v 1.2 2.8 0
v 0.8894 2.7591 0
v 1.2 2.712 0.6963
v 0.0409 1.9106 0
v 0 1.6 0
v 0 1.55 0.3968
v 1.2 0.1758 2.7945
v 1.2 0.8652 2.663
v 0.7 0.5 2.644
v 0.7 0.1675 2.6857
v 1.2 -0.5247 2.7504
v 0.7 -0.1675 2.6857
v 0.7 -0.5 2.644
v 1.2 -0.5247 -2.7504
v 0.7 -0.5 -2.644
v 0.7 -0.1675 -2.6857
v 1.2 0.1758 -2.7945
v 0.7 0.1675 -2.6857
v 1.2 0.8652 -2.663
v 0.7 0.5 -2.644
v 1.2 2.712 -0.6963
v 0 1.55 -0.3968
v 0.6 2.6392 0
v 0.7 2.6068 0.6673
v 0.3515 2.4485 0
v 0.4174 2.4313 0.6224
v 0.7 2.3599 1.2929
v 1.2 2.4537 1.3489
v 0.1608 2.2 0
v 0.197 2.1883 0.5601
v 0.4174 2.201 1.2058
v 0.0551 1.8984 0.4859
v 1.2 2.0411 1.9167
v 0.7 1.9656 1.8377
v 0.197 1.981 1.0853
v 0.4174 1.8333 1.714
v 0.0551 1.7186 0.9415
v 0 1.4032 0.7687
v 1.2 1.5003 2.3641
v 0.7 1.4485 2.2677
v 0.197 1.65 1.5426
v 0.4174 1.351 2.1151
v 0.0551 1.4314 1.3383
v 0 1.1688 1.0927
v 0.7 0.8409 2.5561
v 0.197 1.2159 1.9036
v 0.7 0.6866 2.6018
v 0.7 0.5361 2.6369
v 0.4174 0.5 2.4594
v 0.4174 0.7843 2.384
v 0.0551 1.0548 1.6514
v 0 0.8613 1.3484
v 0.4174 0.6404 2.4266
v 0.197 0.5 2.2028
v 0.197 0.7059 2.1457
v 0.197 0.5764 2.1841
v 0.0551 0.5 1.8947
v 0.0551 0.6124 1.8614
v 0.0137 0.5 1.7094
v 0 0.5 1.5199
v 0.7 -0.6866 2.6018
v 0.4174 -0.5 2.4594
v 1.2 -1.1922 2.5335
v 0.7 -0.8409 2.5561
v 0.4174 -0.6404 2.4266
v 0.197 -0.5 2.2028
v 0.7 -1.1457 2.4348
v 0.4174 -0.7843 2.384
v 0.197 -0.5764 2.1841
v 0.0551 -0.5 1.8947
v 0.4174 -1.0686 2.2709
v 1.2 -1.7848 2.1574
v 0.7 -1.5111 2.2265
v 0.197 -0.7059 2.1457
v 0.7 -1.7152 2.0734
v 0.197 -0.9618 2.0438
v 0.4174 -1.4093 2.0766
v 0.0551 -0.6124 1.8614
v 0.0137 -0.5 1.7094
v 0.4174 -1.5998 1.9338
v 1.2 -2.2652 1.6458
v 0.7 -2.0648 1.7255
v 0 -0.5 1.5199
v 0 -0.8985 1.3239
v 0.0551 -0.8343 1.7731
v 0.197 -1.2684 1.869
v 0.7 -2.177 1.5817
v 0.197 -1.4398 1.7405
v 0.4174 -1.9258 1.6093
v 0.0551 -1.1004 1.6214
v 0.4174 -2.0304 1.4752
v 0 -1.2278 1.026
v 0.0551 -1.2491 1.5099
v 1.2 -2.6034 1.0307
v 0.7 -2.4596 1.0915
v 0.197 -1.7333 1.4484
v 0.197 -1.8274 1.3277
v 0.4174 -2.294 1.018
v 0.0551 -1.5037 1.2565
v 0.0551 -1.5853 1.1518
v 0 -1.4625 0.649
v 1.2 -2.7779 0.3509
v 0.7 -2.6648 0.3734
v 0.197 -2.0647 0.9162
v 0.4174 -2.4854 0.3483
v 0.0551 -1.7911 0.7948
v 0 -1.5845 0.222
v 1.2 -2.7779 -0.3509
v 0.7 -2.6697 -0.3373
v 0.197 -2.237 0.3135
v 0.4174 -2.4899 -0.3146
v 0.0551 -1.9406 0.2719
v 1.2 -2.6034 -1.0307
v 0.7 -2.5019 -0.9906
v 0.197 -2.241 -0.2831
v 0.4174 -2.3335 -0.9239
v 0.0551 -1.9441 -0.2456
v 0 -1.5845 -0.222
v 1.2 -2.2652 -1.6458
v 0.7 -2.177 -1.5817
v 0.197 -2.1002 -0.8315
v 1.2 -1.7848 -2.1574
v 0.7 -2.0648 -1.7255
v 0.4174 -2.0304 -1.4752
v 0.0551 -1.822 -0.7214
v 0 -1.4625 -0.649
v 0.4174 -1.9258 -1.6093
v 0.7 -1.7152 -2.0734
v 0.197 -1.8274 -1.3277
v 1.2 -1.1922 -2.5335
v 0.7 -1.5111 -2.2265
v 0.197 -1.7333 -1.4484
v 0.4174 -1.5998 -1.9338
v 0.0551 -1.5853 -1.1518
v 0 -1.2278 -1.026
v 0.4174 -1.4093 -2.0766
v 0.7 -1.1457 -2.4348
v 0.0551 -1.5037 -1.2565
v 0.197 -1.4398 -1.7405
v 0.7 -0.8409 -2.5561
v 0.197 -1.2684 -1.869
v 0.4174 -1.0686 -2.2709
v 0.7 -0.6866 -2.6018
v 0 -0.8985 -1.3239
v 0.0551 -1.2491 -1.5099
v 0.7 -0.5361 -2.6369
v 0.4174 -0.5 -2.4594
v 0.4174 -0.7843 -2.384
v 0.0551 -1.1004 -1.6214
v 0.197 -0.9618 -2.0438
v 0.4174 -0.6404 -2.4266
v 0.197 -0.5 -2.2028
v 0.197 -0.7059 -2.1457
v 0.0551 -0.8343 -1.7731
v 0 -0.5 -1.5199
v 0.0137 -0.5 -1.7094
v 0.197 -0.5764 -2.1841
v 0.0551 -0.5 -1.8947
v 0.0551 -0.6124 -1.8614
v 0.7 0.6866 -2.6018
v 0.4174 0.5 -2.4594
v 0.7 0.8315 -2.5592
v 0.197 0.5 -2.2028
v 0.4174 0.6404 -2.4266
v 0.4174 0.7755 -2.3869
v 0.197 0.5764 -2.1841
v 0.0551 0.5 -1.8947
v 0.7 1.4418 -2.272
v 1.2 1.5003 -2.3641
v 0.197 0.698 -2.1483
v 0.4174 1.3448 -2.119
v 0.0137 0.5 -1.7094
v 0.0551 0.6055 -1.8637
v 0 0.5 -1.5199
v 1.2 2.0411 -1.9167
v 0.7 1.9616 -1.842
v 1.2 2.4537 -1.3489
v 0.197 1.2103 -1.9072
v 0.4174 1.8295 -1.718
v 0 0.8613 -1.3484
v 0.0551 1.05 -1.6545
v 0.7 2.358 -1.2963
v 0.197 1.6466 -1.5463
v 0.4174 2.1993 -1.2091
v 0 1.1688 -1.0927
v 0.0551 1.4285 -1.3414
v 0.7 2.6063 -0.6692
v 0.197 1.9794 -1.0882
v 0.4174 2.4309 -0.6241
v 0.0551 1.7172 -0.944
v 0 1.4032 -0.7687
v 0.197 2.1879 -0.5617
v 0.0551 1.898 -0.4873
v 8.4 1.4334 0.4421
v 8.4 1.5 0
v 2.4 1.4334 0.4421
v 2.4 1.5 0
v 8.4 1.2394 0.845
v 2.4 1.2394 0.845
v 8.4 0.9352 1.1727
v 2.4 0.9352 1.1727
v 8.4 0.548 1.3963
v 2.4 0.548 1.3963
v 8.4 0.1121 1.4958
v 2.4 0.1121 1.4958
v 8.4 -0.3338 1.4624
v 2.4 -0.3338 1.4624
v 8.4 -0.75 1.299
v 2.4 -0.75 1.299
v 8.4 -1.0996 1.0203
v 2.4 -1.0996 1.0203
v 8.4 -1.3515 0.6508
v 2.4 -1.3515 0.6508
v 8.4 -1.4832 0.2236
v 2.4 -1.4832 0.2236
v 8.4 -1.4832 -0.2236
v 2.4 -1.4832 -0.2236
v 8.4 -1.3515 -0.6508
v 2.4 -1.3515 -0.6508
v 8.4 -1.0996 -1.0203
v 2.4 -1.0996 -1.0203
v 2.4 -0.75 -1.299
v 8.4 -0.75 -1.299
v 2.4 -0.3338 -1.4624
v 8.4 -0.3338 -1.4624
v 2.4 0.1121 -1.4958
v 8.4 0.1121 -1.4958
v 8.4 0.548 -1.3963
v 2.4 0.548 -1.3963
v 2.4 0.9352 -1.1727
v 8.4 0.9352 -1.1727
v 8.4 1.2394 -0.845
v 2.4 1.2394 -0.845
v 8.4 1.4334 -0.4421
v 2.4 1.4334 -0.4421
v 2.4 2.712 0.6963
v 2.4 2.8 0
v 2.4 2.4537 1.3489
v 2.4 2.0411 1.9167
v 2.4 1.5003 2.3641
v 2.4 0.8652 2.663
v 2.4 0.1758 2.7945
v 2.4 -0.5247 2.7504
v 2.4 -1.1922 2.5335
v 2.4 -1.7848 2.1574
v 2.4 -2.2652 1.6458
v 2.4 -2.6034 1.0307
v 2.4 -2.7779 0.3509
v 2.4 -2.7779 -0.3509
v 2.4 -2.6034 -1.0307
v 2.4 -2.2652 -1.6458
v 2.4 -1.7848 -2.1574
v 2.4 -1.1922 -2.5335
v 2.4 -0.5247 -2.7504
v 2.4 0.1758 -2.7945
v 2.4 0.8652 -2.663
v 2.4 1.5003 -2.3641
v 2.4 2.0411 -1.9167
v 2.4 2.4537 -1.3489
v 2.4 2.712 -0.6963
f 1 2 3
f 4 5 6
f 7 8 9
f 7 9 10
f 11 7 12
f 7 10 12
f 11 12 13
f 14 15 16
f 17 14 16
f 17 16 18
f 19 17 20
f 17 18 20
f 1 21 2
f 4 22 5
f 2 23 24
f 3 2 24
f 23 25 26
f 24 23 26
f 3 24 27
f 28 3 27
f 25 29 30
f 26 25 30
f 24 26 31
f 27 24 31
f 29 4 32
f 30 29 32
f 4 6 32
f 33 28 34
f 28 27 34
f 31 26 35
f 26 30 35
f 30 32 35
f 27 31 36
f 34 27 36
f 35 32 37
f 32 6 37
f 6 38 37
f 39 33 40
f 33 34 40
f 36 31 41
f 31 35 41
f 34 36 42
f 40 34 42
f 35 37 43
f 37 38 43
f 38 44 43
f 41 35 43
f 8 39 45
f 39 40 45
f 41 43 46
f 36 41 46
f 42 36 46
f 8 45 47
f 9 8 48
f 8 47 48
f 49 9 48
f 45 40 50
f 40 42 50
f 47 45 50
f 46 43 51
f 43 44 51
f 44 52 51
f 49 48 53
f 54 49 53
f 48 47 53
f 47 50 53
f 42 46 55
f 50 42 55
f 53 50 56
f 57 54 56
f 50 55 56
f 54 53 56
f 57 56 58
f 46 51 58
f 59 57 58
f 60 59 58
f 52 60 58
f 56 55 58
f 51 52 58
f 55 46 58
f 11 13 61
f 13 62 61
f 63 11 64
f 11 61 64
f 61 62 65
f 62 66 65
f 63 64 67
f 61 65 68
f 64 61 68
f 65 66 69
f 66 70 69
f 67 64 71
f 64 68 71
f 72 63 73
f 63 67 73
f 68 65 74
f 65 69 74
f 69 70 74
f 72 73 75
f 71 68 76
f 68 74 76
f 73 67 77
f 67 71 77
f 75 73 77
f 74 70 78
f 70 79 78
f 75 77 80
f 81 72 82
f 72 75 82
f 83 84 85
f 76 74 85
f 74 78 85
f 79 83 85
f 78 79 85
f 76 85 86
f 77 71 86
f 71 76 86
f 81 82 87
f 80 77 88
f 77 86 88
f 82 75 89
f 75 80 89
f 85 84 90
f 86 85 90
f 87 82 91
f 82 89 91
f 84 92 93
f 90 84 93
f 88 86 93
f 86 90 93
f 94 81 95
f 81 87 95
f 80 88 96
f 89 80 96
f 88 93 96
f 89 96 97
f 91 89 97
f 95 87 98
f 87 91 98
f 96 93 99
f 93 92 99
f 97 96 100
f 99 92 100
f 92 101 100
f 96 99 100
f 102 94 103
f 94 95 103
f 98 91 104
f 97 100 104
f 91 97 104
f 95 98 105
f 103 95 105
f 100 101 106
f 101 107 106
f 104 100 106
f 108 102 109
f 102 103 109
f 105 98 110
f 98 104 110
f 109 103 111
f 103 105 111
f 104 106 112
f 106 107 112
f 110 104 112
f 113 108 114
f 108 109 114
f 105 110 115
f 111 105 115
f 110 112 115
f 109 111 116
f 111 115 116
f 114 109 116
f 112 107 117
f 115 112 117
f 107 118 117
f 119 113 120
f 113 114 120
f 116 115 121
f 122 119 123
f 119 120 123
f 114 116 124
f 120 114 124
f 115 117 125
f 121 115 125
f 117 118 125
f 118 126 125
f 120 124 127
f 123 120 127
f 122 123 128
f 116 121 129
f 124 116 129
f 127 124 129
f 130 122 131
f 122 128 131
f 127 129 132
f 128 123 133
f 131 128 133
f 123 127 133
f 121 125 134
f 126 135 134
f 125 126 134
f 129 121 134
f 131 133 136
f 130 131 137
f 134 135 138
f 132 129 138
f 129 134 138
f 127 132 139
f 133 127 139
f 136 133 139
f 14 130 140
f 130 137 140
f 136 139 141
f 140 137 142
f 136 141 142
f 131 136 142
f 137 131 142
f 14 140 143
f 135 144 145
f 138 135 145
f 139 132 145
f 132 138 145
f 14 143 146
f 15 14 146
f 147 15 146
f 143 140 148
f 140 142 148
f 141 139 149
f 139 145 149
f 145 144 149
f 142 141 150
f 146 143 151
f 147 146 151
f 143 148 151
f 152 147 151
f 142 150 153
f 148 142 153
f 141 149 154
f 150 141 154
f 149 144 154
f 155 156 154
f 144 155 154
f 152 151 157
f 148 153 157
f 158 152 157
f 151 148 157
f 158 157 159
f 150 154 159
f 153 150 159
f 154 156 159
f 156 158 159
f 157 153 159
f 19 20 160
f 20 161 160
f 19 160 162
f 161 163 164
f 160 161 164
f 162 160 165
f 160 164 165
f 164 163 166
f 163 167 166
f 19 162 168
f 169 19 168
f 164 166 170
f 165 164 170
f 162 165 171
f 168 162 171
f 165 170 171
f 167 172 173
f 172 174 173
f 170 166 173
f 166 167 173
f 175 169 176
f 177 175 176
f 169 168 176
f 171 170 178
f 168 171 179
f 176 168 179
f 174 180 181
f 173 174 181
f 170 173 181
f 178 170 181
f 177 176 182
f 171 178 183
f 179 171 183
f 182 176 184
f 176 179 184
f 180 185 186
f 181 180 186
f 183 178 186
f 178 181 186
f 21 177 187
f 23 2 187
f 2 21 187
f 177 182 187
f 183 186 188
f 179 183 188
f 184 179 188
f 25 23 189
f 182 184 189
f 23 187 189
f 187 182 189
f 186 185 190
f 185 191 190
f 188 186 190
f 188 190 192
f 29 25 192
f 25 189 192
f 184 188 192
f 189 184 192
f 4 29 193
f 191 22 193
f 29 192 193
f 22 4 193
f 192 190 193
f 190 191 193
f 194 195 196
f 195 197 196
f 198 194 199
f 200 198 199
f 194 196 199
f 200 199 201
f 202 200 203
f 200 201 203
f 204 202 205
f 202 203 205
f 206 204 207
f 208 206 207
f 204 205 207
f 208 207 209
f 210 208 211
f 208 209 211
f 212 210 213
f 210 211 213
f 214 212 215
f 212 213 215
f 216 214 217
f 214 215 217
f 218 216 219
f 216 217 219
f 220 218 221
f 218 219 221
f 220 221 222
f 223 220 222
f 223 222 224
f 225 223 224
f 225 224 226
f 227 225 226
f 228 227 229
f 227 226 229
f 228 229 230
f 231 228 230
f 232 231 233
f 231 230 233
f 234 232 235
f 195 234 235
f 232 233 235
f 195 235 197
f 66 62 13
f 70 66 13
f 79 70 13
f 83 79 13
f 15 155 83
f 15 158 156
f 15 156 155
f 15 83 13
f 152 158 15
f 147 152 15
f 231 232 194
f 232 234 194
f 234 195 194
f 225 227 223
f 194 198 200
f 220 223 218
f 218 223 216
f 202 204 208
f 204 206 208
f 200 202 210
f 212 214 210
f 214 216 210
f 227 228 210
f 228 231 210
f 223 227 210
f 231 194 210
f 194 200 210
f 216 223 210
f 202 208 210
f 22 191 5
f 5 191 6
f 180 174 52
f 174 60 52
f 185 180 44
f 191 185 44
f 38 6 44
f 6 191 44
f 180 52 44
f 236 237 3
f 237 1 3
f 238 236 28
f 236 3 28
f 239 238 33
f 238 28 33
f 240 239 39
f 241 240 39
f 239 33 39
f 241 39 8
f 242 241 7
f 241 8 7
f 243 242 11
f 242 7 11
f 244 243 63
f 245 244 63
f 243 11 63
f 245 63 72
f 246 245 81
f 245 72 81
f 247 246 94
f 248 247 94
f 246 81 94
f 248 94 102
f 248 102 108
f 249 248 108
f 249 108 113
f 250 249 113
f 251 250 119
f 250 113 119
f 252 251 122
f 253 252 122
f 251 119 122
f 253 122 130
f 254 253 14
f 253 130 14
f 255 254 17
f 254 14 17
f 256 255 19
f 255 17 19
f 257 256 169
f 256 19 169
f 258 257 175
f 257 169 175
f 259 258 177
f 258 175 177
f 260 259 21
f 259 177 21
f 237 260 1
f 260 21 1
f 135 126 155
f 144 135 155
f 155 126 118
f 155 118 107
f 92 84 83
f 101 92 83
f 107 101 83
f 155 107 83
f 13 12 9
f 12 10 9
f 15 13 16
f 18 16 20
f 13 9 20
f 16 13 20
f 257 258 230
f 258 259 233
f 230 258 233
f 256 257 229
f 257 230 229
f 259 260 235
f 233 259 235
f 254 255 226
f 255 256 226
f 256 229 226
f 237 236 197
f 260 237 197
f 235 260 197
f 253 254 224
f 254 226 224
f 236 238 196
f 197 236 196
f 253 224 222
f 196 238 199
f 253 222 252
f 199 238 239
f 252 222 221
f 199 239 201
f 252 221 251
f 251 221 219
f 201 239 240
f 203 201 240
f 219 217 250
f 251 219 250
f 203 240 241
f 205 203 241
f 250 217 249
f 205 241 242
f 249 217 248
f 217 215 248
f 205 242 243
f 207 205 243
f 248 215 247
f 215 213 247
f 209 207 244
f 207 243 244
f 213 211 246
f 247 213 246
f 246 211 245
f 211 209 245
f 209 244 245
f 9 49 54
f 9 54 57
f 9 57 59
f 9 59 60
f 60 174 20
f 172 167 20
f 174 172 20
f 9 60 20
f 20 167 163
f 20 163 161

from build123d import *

# Parameters (mm, degrees)
SKETCH2_W  = 5.6
SKETCH2_H  = 1
SLOT_DEPTH = 0.7


with BuildPart() as part:
    # BodySke → Base-Revolve (revolve)
    with BuildSketch(Plane.XY):
        with BuildLine():
            Line((2.4, 1.5), (2.4, 2.8))
            Line((2.4, 2.8), (1.2, 2.8))
            ThreePointArc((1.2, 2.8), (0.351471863, 2.448528137), (0, 1.6))
            Line((0, 1.6), (0, 0))
            Line((0, 0), (8.4, 0))
            Line((8.4, 0), (8.4, 1.5))
            Line((8.4, 1.5), (2.4, 1.5))
        make_face()
    revolve(axis=Axis((-25.4, 0, 0), (1, 0, 0)))

    # Sketch2 → Slot (cut)
    with BuildSketch(Plane(origin=(0, 0, 0), x_dir=(0, 0, -1), z_dir=(1, 0, 0))):
        Rectangle(SKETCH2_W, SKETCH2_H)
    extrude(amount=SLOT_DEPTH, mode=Mode.SUBTRACT)


solid = part.part
